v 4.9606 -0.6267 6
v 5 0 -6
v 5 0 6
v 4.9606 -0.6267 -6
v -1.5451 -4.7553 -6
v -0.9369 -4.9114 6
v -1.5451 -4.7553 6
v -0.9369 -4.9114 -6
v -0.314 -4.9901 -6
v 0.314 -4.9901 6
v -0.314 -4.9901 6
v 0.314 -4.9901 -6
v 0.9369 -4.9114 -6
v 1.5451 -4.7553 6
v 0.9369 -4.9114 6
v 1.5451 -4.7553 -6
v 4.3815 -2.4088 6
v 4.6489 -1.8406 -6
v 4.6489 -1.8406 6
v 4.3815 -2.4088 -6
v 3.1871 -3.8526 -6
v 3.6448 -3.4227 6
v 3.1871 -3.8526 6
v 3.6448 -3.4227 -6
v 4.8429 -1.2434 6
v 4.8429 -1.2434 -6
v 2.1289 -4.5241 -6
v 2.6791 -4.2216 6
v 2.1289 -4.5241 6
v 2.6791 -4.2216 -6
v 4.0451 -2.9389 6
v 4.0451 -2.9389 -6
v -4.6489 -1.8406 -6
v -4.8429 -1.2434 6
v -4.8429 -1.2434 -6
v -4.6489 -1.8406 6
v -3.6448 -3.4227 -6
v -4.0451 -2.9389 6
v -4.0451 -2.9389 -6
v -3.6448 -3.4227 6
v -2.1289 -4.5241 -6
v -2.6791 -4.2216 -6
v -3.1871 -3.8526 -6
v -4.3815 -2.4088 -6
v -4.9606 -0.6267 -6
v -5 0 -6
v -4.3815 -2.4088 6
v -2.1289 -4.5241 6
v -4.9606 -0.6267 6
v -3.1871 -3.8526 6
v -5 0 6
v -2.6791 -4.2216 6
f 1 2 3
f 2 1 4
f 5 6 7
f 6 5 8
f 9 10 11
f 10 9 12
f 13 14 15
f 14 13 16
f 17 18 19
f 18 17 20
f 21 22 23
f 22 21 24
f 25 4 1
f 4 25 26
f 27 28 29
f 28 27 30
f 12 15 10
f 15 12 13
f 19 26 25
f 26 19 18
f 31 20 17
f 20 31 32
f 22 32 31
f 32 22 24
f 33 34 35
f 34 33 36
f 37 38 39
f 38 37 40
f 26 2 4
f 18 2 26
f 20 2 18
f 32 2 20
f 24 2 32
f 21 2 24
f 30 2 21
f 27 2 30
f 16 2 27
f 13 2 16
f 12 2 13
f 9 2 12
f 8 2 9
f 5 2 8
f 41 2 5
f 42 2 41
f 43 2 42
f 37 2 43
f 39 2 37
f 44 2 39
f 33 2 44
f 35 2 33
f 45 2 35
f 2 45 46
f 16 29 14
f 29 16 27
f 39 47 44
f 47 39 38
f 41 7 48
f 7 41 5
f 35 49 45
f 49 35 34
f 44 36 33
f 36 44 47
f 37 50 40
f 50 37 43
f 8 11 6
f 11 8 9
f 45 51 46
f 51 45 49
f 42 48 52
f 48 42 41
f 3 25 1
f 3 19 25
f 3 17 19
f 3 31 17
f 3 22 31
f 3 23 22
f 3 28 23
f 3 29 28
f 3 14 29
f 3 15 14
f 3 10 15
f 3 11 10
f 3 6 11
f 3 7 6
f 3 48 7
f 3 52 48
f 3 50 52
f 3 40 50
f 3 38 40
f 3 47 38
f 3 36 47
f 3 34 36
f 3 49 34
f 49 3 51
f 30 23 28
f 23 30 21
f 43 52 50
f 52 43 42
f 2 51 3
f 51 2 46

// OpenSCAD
$fn = 50;

difference() {
	union() {
		translate(v = [0, 0, 0]) {
			rotate(a = [0, 0, 0]) {
				difference() {
					union() {
						translate(v = [0, 0, -6.0]) {
							cylinder(h = 12, r = 5);
						}
					}
					union() {
						translate(v = [-5.1, 0, -6.1]) {
							cube(size = [10.2, 5.1, 12.2]);
						}
					}
				}
			}
		}
	}
	union();
}
